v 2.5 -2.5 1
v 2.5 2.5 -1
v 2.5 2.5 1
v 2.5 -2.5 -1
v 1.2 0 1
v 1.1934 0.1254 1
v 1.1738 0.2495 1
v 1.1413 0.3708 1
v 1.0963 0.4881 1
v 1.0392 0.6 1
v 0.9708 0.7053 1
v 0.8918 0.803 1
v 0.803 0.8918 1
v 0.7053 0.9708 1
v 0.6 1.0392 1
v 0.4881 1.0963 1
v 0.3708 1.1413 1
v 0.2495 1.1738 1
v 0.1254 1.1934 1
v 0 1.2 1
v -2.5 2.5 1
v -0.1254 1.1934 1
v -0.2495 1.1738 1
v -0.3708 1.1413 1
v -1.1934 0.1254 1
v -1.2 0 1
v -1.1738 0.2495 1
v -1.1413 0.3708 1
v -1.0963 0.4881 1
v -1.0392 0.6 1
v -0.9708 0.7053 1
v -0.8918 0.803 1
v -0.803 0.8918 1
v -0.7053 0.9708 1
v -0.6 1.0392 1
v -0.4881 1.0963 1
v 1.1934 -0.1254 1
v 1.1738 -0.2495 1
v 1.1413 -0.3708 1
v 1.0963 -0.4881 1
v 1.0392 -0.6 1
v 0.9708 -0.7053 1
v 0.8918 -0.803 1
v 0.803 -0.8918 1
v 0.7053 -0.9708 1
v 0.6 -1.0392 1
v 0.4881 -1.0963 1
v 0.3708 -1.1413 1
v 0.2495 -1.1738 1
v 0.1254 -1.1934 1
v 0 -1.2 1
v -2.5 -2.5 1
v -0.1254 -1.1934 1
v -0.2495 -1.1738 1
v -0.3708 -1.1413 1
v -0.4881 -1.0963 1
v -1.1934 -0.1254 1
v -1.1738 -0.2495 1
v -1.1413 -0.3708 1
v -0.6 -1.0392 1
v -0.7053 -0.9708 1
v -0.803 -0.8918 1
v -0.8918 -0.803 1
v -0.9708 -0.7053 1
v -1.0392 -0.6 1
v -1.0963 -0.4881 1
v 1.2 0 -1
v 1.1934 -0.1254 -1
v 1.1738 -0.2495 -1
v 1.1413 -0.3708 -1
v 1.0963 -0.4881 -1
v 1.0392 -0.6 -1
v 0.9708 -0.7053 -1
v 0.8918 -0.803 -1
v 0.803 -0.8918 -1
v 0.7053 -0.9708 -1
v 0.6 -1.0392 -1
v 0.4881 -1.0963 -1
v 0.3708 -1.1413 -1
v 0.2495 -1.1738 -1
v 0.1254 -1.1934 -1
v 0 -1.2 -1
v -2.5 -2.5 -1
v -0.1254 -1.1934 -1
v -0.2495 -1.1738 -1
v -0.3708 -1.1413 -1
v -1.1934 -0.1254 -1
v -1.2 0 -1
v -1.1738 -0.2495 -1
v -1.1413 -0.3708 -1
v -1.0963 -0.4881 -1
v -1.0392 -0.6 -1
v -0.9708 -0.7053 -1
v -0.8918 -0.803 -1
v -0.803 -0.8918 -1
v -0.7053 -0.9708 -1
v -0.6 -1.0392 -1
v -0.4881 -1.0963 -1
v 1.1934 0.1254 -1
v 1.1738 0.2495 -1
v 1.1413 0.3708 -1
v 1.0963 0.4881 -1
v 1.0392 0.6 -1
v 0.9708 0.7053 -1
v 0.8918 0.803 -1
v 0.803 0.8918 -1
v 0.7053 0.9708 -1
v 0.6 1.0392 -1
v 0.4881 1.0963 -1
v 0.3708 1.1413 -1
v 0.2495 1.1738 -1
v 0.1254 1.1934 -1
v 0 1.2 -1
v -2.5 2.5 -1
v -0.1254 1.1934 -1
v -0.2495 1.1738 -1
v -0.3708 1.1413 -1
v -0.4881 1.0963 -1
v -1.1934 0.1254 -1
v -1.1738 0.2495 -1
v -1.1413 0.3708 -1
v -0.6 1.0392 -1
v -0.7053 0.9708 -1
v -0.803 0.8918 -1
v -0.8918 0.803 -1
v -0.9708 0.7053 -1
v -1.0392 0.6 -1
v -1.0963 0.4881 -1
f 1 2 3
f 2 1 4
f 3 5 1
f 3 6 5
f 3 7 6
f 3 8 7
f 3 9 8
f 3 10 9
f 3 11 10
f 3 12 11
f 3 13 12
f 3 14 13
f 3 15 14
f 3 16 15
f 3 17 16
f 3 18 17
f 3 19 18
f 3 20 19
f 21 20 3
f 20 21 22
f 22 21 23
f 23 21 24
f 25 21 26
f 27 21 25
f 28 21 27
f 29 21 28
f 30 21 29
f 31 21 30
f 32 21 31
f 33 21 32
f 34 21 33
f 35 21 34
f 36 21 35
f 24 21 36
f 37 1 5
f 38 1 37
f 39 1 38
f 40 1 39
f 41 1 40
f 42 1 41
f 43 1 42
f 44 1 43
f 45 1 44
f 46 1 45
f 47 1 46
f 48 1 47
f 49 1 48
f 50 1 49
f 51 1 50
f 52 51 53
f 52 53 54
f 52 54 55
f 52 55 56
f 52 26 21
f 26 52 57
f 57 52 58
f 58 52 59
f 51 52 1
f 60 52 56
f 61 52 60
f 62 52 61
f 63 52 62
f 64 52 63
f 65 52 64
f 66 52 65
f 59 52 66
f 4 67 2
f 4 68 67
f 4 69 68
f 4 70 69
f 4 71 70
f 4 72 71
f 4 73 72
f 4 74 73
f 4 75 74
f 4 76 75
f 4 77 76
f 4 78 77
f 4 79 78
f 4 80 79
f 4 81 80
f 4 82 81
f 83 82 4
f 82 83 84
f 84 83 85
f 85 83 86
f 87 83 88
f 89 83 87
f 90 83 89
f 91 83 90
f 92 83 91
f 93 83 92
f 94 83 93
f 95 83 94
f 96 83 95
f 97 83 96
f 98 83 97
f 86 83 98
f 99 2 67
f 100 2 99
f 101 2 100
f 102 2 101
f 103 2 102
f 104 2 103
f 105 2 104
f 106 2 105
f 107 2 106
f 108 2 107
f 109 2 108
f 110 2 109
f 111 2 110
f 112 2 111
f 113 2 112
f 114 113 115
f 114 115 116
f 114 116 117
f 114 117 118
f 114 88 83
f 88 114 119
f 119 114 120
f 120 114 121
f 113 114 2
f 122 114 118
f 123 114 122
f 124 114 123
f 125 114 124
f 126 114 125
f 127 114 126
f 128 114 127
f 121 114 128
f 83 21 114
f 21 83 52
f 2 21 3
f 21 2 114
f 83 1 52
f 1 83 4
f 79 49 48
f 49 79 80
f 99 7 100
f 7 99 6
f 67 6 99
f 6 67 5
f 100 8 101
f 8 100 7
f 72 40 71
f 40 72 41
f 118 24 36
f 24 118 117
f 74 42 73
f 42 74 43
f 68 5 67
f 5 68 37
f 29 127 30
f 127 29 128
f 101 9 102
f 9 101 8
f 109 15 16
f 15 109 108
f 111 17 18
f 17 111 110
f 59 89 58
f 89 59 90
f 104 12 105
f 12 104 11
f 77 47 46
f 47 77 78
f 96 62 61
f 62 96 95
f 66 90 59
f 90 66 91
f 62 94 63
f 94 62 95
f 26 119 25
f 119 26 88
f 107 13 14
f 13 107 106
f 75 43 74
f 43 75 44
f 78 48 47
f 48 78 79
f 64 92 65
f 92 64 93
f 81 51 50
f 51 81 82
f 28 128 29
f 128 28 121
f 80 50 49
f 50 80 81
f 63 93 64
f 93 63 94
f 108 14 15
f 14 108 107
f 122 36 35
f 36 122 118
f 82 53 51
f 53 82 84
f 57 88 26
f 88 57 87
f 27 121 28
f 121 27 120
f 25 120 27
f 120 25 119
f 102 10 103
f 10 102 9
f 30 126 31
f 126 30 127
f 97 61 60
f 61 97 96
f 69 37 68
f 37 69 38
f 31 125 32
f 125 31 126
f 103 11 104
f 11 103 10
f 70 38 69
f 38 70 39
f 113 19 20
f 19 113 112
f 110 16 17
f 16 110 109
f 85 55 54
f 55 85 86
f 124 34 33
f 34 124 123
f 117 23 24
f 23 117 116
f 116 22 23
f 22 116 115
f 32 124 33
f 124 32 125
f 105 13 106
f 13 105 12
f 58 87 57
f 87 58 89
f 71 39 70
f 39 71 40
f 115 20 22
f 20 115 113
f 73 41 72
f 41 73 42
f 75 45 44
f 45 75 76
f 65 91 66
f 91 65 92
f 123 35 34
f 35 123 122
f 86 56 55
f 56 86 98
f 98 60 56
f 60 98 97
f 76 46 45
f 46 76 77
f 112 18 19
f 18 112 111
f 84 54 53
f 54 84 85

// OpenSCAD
// Square nut.
$fn = 60;
eps = 0.02;
thread_d = 2.4;
side = 5;
thickness = 2;
difference() {
    cube([side, side, thickness], center = true);
    translate([0, 0, -thickness / 2 - eps]) cylinder(d = thread_d, h = thickness + 2 * eps);
}
